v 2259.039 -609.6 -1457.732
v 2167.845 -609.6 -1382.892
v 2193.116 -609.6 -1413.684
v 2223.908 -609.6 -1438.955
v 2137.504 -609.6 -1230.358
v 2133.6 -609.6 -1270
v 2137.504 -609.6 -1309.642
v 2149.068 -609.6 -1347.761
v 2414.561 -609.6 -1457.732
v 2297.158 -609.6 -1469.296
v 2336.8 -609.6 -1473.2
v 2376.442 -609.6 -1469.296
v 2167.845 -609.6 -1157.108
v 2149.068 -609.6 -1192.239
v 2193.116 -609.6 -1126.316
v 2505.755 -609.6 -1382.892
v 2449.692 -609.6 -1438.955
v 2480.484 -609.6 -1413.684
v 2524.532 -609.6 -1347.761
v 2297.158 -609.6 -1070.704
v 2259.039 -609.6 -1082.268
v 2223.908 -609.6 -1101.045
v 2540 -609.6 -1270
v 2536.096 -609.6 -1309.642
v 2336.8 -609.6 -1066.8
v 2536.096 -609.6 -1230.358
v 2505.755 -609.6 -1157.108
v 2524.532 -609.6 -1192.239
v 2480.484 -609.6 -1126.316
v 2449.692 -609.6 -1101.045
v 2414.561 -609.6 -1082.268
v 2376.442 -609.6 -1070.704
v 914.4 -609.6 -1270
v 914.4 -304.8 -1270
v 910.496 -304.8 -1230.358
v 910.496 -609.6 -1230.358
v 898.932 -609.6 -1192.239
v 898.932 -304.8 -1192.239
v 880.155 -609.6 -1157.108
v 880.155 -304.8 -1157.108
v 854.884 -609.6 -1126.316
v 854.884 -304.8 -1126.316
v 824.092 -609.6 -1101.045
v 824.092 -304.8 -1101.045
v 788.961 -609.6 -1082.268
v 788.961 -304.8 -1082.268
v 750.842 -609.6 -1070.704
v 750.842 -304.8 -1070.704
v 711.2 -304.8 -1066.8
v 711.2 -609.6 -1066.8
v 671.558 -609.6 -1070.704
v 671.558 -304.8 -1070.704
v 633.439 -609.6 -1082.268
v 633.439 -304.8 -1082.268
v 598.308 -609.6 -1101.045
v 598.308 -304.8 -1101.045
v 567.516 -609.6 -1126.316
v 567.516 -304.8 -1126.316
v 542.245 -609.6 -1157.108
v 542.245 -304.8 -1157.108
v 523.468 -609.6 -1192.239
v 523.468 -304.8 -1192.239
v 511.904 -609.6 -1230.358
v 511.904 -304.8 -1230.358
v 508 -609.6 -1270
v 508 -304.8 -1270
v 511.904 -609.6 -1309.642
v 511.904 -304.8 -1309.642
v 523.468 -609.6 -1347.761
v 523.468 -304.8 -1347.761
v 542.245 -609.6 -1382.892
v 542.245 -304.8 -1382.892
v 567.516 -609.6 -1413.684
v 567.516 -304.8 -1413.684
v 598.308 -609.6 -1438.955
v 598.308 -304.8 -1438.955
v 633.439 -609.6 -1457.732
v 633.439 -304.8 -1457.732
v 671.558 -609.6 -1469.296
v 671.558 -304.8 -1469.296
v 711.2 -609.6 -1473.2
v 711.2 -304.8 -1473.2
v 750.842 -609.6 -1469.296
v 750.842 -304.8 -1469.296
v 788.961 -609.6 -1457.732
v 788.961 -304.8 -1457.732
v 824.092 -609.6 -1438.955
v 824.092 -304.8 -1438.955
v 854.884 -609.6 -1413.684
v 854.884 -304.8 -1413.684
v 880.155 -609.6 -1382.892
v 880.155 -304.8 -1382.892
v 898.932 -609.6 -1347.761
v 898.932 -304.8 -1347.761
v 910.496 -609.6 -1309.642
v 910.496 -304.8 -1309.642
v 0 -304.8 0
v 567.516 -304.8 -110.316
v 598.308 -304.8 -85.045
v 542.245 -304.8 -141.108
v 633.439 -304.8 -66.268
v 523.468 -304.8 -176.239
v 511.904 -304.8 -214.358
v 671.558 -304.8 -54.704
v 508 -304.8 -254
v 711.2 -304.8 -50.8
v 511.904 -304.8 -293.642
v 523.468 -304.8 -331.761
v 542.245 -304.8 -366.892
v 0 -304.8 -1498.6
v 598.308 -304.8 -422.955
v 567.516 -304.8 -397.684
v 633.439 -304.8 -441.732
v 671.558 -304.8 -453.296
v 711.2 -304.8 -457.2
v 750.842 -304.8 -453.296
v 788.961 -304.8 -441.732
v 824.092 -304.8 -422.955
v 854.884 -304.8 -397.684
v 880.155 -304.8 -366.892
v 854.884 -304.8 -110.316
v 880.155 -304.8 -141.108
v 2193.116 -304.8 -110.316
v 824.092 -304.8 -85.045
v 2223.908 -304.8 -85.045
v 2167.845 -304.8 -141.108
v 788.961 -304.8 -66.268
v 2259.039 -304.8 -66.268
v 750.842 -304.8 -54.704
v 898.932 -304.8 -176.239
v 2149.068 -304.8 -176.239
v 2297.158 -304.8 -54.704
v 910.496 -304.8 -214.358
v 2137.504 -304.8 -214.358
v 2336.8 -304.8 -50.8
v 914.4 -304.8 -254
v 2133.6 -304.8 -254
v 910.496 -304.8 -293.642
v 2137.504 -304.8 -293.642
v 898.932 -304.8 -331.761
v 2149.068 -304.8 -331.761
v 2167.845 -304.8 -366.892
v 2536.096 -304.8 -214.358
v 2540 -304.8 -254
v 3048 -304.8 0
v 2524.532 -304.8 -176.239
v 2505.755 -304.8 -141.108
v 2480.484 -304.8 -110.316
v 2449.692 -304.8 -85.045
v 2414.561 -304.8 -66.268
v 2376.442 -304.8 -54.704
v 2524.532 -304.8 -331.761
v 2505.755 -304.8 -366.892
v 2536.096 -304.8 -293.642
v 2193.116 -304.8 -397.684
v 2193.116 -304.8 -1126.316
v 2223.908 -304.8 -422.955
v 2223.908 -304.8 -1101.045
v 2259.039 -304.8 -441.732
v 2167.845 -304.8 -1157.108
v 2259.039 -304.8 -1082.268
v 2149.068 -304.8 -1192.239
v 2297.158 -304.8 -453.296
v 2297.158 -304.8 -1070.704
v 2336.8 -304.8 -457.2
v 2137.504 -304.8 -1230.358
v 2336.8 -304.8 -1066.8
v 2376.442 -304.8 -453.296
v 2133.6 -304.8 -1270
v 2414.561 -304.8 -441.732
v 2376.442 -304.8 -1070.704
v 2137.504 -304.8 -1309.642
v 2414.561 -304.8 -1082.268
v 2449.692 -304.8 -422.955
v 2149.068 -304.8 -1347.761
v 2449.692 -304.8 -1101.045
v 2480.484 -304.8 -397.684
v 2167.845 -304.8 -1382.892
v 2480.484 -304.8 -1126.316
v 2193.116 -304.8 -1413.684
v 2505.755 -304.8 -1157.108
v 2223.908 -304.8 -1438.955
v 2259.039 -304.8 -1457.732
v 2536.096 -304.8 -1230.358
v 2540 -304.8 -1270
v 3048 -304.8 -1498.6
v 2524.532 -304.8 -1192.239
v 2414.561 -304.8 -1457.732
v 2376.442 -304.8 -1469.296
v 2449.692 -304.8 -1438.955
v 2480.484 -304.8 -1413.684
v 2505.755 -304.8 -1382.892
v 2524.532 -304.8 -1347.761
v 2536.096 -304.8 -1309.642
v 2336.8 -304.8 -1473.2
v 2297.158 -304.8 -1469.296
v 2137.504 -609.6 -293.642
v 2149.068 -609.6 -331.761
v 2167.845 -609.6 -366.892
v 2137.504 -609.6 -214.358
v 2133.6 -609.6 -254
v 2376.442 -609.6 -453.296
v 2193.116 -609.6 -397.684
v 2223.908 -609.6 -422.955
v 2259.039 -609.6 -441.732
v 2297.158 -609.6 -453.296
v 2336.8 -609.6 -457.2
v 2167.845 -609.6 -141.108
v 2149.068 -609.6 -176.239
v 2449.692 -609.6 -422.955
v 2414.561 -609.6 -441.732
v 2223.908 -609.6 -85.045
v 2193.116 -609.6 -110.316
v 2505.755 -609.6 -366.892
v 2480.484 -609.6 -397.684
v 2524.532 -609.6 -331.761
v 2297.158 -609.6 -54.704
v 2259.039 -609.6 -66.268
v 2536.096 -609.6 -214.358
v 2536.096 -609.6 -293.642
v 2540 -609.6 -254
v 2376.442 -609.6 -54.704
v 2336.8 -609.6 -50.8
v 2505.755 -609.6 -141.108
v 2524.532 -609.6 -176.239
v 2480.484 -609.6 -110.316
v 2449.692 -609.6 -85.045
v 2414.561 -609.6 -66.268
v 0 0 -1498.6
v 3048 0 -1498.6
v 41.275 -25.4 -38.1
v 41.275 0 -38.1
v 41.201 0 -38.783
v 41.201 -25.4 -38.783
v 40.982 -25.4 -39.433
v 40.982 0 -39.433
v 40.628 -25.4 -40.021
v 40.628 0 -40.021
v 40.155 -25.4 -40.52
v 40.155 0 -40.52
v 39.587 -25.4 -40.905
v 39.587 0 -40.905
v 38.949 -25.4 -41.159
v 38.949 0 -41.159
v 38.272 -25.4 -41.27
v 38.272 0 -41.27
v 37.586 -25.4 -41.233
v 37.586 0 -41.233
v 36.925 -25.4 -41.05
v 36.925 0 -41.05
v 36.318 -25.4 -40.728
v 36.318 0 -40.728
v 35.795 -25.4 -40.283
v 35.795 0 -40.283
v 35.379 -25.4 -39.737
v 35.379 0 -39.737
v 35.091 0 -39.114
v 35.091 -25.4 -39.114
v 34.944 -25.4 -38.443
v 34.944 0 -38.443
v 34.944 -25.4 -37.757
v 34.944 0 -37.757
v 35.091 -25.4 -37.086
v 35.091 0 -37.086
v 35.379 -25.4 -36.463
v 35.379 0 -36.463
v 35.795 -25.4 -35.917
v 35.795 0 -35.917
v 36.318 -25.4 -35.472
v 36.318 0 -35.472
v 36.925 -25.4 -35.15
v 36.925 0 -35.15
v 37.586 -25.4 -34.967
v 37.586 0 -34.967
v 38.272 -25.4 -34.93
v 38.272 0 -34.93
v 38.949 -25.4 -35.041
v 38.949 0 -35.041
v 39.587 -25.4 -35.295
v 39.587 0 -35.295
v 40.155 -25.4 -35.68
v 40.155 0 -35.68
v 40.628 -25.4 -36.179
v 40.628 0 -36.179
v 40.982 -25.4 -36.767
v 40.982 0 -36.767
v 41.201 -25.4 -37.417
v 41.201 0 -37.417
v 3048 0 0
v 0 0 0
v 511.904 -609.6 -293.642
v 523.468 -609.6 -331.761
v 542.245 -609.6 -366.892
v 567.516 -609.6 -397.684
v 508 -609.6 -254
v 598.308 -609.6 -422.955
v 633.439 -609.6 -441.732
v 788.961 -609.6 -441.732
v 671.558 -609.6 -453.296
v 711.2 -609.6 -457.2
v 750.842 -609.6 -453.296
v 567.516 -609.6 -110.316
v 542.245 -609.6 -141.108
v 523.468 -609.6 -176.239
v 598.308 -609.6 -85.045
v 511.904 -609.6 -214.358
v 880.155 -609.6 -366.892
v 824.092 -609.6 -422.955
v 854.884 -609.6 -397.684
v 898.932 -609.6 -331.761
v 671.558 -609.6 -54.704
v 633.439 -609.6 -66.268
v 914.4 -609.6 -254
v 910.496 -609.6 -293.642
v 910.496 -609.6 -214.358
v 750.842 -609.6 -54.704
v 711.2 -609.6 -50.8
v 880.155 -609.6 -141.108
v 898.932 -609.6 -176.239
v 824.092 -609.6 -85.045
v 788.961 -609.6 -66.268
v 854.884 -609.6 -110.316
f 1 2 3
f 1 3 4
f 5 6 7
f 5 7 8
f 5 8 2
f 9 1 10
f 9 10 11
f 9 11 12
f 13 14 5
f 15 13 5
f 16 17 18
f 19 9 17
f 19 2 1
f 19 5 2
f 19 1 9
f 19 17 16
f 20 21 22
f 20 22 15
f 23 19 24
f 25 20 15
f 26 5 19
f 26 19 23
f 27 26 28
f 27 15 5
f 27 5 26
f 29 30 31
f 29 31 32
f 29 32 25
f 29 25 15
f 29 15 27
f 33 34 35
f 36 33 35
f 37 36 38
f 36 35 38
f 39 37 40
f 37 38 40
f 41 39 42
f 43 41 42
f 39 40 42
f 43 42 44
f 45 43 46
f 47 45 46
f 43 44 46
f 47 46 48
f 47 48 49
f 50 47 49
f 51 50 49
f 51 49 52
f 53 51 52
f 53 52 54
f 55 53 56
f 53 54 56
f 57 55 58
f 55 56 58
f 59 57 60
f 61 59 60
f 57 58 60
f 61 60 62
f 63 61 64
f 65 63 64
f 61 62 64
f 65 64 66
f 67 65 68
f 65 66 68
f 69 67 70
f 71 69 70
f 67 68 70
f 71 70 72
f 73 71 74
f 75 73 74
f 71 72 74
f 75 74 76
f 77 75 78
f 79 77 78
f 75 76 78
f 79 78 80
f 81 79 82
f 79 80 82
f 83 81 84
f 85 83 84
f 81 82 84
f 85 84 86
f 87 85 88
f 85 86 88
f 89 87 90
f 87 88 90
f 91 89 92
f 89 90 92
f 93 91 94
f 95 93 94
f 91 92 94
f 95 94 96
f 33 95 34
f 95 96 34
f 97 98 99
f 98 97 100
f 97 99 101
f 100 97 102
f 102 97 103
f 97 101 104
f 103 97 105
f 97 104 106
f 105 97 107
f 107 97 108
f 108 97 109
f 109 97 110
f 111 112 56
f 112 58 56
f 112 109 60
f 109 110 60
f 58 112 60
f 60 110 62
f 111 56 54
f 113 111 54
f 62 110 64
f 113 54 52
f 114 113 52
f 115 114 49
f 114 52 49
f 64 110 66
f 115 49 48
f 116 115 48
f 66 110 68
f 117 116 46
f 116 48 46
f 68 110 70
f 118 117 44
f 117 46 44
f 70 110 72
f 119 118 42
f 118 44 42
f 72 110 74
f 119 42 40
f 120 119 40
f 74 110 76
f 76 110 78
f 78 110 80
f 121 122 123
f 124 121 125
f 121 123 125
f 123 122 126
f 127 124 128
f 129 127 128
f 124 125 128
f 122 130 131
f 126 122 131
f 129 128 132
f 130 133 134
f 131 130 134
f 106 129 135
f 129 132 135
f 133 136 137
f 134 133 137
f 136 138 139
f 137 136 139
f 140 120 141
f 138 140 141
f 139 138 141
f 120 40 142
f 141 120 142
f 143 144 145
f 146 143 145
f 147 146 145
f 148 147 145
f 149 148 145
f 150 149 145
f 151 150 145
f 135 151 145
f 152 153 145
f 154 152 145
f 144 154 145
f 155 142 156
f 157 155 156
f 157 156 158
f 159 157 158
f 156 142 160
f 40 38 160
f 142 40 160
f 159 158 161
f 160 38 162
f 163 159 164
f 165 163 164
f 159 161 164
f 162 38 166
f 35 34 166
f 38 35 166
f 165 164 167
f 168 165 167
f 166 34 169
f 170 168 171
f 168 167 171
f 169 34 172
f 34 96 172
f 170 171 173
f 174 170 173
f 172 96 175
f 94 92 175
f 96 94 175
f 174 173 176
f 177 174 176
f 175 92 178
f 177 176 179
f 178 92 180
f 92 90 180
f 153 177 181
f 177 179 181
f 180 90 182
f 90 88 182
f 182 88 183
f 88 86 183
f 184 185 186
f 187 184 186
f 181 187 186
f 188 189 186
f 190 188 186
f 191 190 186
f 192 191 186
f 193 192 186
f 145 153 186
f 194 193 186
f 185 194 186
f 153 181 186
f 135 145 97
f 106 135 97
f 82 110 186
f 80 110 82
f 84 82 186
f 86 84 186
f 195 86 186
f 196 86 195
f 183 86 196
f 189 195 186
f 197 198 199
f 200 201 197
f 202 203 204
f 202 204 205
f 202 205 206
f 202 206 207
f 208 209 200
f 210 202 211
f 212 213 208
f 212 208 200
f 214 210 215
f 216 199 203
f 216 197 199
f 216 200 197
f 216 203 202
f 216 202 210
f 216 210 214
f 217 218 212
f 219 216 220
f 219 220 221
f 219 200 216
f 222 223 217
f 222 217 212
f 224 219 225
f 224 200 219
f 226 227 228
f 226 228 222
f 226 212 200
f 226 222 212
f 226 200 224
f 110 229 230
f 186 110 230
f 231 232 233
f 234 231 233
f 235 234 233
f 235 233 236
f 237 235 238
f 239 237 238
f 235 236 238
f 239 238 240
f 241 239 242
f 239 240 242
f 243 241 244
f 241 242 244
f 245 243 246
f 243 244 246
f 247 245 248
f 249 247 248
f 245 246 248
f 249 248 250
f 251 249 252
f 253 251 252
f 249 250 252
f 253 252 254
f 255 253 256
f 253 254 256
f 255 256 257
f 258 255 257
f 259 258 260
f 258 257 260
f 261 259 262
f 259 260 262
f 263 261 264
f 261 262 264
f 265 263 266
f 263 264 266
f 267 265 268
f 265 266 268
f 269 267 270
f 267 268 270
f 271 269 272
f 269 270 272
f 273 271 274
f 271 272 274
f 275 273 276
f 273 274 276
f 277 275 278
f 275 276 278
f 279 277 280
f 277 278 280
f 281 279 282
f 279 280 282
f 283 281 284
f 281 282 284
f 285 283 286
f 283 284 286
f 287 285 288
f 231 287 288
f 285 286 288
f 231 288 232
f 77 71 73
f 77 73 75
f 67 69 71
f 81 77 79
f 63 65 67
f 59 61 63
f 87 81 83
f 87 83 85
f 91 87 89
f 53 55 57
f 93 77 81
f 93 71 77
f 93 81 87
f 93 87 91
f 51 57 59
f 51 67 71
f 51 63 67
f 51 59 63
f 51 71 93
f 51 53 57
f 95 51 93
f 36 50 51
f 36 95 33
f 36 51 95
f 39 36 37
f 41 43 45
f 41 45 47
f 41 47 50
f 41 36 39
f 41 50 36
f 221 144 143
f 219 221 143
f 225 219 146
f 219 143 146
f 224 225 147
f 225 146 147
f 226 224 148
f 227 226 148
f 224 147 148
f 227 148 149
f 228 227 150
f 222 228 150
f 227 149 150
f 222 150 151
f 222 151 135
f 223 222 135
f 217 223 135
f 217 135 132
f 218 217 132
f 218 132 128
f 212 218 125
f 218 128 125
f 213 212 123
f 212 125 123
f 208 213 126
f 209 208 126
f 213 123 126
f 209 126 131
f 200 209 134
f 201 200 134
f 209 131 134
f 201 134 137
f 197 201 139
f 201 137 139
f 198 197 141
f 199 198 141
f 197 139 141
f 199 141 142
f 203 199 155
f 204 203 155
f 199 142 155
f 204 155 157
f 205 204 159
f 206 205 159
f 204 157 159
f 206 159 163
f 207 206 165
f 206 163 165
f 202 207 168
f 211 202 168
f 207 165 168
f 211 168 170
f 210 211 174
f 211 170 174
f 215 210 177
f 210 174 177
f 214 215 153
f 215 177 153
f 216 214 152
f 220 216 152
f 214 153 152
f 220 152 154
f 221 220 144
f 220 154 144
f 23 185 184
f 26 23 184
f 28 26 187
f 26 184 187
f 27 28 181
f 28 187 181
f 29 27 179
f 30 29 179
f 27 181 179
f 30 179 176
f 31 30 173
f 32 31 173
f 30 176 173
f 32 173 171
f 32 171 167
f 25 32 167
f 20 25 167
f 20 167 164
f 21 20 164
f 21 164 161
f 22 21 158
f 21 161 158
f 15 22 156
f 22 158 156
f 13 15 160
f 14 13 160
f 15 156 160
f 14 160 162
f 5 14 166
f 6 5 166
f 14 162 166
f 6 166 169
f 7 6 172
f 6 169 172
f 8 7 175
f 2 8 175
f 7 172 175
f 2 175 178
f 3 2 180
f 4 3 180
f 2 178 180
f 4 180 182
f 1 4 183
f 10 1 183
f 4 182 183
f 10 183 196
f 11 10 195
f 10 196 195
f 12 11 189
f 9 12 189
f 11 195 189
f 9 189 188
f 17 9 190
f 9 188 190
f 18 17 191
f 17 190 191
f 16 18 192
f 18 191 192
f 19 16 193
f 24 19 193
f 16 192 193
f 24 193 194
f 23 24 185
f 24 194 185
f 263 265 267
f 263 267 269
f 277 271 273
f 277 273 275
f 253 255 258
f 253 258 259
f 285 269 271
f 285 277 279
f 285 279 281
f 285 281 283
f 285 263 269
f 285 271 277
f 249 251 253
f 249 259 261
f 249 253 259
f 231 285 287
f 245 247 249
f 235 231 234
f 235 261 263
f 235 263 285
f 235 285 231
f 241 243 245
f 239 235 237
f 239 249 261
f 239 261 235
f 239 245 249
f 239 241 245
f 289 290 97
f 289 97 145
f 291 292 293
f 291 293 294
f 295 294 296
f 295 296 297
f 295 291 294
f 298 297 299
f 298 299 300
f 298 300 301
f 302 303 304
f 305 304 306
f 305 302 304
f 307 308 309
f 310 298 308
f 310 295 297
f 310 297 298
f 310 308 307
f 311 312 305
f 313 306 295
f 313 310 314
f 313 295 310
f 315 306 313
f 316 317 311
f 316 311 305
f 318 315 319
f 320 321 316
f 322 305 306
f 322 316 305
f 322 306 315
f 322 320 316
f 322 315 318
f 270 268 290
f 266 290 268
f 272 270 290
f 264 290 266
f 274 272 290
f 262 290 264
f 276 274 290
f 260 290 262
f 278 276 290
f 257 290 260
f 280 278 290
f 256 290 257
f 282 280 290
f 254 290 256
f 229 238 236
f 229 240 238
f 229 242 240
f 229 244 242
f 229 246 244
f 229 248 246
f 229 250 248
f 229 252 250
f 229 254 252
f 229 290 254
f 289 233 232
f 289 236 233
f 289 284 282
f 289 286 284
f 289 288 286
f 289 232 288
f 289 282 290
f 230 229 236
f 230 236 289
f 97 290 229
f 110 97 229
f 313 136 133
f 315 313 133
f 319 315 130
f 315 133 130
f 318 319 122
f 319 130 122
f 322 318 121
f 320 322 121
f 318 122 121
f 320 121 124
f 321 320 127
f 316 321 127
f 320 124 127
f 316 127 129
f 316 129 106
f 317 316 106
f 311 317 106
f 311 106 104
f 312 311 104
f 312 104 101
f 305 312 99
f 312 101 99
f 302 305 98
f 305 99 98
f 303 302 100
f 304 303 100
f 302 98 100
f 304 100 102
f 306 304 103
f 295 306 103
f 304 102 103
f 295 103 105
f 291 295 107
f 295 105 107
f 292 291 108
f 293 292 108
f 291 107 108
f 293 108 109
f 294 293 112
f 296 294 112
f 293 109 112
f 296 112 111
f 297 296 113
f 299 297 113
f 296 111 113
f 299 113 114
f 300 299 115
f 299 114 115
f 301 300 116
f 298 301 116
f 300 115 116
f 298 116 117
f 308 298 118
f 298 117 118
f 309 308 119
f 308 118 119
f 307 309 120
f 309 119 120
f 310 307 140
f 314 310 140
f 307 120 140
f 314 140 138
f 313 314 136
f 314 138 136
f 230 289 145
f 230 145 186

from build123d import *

# Parameters (mm, degrees)
SKETCH1_W           = 3048
SKETCH1_H           = 1498.6
BOSS_EXTRUDE1_DEPTH = 304.8
SKETCH2_R           = 203.2
BOSS_EXTRUDE2_DEPTH = 304.8
SKETCH3_R           = 3.175
CUT_EXTRUDE1_DEPTH  = 25.4


with BuildPart() as part:
    # Sketch1 → Boss-Extrude1 (new body)
    with BuildSketch(Plane(origin=(0, 0, 0), x_dir=(1, 0, 0), z_dir=(0, 1, 0))):
        with Locations((1524, 749.3)):
            Rectangle(SKETCH1_W, SKETCH1_H)
    extrude(amount=-BOSS_EXTRUDE1_DEPTH)

    # Sketch2 → Boss-Extrude2 (add)
    with BuildSketch(Plane.XZ.offset(304.8)):
        with Locations((711.2, -254)):
            Circle(SKETCH2_R)
        with Locations((2336.8, -254)):
            Circle(SKETCH2_R)
        with Locations((711.2, -1270)):
            Circle(SKETCH2_R)
        with Locations((2336.8, -1270)):
            Circle(SKETCH2_R)
    extrude(amount=BOSS_EXTRUDE2_DEPTH)

    # Sketch3 → Cut-Extrude1 (cut)
    with BuildSketch(Plane(origin=(0, 0, 0), x_dir=(1, 0, 0), z_dir=(0, 1, 0))):
        with Locations((38.1, 38.1)):
            Circle(SKETCH3_R)
    extrude(amount=-CUT_EXTRUDE1_DEPTH, mode=Mode.SUBTRACT)


solid = part.part
